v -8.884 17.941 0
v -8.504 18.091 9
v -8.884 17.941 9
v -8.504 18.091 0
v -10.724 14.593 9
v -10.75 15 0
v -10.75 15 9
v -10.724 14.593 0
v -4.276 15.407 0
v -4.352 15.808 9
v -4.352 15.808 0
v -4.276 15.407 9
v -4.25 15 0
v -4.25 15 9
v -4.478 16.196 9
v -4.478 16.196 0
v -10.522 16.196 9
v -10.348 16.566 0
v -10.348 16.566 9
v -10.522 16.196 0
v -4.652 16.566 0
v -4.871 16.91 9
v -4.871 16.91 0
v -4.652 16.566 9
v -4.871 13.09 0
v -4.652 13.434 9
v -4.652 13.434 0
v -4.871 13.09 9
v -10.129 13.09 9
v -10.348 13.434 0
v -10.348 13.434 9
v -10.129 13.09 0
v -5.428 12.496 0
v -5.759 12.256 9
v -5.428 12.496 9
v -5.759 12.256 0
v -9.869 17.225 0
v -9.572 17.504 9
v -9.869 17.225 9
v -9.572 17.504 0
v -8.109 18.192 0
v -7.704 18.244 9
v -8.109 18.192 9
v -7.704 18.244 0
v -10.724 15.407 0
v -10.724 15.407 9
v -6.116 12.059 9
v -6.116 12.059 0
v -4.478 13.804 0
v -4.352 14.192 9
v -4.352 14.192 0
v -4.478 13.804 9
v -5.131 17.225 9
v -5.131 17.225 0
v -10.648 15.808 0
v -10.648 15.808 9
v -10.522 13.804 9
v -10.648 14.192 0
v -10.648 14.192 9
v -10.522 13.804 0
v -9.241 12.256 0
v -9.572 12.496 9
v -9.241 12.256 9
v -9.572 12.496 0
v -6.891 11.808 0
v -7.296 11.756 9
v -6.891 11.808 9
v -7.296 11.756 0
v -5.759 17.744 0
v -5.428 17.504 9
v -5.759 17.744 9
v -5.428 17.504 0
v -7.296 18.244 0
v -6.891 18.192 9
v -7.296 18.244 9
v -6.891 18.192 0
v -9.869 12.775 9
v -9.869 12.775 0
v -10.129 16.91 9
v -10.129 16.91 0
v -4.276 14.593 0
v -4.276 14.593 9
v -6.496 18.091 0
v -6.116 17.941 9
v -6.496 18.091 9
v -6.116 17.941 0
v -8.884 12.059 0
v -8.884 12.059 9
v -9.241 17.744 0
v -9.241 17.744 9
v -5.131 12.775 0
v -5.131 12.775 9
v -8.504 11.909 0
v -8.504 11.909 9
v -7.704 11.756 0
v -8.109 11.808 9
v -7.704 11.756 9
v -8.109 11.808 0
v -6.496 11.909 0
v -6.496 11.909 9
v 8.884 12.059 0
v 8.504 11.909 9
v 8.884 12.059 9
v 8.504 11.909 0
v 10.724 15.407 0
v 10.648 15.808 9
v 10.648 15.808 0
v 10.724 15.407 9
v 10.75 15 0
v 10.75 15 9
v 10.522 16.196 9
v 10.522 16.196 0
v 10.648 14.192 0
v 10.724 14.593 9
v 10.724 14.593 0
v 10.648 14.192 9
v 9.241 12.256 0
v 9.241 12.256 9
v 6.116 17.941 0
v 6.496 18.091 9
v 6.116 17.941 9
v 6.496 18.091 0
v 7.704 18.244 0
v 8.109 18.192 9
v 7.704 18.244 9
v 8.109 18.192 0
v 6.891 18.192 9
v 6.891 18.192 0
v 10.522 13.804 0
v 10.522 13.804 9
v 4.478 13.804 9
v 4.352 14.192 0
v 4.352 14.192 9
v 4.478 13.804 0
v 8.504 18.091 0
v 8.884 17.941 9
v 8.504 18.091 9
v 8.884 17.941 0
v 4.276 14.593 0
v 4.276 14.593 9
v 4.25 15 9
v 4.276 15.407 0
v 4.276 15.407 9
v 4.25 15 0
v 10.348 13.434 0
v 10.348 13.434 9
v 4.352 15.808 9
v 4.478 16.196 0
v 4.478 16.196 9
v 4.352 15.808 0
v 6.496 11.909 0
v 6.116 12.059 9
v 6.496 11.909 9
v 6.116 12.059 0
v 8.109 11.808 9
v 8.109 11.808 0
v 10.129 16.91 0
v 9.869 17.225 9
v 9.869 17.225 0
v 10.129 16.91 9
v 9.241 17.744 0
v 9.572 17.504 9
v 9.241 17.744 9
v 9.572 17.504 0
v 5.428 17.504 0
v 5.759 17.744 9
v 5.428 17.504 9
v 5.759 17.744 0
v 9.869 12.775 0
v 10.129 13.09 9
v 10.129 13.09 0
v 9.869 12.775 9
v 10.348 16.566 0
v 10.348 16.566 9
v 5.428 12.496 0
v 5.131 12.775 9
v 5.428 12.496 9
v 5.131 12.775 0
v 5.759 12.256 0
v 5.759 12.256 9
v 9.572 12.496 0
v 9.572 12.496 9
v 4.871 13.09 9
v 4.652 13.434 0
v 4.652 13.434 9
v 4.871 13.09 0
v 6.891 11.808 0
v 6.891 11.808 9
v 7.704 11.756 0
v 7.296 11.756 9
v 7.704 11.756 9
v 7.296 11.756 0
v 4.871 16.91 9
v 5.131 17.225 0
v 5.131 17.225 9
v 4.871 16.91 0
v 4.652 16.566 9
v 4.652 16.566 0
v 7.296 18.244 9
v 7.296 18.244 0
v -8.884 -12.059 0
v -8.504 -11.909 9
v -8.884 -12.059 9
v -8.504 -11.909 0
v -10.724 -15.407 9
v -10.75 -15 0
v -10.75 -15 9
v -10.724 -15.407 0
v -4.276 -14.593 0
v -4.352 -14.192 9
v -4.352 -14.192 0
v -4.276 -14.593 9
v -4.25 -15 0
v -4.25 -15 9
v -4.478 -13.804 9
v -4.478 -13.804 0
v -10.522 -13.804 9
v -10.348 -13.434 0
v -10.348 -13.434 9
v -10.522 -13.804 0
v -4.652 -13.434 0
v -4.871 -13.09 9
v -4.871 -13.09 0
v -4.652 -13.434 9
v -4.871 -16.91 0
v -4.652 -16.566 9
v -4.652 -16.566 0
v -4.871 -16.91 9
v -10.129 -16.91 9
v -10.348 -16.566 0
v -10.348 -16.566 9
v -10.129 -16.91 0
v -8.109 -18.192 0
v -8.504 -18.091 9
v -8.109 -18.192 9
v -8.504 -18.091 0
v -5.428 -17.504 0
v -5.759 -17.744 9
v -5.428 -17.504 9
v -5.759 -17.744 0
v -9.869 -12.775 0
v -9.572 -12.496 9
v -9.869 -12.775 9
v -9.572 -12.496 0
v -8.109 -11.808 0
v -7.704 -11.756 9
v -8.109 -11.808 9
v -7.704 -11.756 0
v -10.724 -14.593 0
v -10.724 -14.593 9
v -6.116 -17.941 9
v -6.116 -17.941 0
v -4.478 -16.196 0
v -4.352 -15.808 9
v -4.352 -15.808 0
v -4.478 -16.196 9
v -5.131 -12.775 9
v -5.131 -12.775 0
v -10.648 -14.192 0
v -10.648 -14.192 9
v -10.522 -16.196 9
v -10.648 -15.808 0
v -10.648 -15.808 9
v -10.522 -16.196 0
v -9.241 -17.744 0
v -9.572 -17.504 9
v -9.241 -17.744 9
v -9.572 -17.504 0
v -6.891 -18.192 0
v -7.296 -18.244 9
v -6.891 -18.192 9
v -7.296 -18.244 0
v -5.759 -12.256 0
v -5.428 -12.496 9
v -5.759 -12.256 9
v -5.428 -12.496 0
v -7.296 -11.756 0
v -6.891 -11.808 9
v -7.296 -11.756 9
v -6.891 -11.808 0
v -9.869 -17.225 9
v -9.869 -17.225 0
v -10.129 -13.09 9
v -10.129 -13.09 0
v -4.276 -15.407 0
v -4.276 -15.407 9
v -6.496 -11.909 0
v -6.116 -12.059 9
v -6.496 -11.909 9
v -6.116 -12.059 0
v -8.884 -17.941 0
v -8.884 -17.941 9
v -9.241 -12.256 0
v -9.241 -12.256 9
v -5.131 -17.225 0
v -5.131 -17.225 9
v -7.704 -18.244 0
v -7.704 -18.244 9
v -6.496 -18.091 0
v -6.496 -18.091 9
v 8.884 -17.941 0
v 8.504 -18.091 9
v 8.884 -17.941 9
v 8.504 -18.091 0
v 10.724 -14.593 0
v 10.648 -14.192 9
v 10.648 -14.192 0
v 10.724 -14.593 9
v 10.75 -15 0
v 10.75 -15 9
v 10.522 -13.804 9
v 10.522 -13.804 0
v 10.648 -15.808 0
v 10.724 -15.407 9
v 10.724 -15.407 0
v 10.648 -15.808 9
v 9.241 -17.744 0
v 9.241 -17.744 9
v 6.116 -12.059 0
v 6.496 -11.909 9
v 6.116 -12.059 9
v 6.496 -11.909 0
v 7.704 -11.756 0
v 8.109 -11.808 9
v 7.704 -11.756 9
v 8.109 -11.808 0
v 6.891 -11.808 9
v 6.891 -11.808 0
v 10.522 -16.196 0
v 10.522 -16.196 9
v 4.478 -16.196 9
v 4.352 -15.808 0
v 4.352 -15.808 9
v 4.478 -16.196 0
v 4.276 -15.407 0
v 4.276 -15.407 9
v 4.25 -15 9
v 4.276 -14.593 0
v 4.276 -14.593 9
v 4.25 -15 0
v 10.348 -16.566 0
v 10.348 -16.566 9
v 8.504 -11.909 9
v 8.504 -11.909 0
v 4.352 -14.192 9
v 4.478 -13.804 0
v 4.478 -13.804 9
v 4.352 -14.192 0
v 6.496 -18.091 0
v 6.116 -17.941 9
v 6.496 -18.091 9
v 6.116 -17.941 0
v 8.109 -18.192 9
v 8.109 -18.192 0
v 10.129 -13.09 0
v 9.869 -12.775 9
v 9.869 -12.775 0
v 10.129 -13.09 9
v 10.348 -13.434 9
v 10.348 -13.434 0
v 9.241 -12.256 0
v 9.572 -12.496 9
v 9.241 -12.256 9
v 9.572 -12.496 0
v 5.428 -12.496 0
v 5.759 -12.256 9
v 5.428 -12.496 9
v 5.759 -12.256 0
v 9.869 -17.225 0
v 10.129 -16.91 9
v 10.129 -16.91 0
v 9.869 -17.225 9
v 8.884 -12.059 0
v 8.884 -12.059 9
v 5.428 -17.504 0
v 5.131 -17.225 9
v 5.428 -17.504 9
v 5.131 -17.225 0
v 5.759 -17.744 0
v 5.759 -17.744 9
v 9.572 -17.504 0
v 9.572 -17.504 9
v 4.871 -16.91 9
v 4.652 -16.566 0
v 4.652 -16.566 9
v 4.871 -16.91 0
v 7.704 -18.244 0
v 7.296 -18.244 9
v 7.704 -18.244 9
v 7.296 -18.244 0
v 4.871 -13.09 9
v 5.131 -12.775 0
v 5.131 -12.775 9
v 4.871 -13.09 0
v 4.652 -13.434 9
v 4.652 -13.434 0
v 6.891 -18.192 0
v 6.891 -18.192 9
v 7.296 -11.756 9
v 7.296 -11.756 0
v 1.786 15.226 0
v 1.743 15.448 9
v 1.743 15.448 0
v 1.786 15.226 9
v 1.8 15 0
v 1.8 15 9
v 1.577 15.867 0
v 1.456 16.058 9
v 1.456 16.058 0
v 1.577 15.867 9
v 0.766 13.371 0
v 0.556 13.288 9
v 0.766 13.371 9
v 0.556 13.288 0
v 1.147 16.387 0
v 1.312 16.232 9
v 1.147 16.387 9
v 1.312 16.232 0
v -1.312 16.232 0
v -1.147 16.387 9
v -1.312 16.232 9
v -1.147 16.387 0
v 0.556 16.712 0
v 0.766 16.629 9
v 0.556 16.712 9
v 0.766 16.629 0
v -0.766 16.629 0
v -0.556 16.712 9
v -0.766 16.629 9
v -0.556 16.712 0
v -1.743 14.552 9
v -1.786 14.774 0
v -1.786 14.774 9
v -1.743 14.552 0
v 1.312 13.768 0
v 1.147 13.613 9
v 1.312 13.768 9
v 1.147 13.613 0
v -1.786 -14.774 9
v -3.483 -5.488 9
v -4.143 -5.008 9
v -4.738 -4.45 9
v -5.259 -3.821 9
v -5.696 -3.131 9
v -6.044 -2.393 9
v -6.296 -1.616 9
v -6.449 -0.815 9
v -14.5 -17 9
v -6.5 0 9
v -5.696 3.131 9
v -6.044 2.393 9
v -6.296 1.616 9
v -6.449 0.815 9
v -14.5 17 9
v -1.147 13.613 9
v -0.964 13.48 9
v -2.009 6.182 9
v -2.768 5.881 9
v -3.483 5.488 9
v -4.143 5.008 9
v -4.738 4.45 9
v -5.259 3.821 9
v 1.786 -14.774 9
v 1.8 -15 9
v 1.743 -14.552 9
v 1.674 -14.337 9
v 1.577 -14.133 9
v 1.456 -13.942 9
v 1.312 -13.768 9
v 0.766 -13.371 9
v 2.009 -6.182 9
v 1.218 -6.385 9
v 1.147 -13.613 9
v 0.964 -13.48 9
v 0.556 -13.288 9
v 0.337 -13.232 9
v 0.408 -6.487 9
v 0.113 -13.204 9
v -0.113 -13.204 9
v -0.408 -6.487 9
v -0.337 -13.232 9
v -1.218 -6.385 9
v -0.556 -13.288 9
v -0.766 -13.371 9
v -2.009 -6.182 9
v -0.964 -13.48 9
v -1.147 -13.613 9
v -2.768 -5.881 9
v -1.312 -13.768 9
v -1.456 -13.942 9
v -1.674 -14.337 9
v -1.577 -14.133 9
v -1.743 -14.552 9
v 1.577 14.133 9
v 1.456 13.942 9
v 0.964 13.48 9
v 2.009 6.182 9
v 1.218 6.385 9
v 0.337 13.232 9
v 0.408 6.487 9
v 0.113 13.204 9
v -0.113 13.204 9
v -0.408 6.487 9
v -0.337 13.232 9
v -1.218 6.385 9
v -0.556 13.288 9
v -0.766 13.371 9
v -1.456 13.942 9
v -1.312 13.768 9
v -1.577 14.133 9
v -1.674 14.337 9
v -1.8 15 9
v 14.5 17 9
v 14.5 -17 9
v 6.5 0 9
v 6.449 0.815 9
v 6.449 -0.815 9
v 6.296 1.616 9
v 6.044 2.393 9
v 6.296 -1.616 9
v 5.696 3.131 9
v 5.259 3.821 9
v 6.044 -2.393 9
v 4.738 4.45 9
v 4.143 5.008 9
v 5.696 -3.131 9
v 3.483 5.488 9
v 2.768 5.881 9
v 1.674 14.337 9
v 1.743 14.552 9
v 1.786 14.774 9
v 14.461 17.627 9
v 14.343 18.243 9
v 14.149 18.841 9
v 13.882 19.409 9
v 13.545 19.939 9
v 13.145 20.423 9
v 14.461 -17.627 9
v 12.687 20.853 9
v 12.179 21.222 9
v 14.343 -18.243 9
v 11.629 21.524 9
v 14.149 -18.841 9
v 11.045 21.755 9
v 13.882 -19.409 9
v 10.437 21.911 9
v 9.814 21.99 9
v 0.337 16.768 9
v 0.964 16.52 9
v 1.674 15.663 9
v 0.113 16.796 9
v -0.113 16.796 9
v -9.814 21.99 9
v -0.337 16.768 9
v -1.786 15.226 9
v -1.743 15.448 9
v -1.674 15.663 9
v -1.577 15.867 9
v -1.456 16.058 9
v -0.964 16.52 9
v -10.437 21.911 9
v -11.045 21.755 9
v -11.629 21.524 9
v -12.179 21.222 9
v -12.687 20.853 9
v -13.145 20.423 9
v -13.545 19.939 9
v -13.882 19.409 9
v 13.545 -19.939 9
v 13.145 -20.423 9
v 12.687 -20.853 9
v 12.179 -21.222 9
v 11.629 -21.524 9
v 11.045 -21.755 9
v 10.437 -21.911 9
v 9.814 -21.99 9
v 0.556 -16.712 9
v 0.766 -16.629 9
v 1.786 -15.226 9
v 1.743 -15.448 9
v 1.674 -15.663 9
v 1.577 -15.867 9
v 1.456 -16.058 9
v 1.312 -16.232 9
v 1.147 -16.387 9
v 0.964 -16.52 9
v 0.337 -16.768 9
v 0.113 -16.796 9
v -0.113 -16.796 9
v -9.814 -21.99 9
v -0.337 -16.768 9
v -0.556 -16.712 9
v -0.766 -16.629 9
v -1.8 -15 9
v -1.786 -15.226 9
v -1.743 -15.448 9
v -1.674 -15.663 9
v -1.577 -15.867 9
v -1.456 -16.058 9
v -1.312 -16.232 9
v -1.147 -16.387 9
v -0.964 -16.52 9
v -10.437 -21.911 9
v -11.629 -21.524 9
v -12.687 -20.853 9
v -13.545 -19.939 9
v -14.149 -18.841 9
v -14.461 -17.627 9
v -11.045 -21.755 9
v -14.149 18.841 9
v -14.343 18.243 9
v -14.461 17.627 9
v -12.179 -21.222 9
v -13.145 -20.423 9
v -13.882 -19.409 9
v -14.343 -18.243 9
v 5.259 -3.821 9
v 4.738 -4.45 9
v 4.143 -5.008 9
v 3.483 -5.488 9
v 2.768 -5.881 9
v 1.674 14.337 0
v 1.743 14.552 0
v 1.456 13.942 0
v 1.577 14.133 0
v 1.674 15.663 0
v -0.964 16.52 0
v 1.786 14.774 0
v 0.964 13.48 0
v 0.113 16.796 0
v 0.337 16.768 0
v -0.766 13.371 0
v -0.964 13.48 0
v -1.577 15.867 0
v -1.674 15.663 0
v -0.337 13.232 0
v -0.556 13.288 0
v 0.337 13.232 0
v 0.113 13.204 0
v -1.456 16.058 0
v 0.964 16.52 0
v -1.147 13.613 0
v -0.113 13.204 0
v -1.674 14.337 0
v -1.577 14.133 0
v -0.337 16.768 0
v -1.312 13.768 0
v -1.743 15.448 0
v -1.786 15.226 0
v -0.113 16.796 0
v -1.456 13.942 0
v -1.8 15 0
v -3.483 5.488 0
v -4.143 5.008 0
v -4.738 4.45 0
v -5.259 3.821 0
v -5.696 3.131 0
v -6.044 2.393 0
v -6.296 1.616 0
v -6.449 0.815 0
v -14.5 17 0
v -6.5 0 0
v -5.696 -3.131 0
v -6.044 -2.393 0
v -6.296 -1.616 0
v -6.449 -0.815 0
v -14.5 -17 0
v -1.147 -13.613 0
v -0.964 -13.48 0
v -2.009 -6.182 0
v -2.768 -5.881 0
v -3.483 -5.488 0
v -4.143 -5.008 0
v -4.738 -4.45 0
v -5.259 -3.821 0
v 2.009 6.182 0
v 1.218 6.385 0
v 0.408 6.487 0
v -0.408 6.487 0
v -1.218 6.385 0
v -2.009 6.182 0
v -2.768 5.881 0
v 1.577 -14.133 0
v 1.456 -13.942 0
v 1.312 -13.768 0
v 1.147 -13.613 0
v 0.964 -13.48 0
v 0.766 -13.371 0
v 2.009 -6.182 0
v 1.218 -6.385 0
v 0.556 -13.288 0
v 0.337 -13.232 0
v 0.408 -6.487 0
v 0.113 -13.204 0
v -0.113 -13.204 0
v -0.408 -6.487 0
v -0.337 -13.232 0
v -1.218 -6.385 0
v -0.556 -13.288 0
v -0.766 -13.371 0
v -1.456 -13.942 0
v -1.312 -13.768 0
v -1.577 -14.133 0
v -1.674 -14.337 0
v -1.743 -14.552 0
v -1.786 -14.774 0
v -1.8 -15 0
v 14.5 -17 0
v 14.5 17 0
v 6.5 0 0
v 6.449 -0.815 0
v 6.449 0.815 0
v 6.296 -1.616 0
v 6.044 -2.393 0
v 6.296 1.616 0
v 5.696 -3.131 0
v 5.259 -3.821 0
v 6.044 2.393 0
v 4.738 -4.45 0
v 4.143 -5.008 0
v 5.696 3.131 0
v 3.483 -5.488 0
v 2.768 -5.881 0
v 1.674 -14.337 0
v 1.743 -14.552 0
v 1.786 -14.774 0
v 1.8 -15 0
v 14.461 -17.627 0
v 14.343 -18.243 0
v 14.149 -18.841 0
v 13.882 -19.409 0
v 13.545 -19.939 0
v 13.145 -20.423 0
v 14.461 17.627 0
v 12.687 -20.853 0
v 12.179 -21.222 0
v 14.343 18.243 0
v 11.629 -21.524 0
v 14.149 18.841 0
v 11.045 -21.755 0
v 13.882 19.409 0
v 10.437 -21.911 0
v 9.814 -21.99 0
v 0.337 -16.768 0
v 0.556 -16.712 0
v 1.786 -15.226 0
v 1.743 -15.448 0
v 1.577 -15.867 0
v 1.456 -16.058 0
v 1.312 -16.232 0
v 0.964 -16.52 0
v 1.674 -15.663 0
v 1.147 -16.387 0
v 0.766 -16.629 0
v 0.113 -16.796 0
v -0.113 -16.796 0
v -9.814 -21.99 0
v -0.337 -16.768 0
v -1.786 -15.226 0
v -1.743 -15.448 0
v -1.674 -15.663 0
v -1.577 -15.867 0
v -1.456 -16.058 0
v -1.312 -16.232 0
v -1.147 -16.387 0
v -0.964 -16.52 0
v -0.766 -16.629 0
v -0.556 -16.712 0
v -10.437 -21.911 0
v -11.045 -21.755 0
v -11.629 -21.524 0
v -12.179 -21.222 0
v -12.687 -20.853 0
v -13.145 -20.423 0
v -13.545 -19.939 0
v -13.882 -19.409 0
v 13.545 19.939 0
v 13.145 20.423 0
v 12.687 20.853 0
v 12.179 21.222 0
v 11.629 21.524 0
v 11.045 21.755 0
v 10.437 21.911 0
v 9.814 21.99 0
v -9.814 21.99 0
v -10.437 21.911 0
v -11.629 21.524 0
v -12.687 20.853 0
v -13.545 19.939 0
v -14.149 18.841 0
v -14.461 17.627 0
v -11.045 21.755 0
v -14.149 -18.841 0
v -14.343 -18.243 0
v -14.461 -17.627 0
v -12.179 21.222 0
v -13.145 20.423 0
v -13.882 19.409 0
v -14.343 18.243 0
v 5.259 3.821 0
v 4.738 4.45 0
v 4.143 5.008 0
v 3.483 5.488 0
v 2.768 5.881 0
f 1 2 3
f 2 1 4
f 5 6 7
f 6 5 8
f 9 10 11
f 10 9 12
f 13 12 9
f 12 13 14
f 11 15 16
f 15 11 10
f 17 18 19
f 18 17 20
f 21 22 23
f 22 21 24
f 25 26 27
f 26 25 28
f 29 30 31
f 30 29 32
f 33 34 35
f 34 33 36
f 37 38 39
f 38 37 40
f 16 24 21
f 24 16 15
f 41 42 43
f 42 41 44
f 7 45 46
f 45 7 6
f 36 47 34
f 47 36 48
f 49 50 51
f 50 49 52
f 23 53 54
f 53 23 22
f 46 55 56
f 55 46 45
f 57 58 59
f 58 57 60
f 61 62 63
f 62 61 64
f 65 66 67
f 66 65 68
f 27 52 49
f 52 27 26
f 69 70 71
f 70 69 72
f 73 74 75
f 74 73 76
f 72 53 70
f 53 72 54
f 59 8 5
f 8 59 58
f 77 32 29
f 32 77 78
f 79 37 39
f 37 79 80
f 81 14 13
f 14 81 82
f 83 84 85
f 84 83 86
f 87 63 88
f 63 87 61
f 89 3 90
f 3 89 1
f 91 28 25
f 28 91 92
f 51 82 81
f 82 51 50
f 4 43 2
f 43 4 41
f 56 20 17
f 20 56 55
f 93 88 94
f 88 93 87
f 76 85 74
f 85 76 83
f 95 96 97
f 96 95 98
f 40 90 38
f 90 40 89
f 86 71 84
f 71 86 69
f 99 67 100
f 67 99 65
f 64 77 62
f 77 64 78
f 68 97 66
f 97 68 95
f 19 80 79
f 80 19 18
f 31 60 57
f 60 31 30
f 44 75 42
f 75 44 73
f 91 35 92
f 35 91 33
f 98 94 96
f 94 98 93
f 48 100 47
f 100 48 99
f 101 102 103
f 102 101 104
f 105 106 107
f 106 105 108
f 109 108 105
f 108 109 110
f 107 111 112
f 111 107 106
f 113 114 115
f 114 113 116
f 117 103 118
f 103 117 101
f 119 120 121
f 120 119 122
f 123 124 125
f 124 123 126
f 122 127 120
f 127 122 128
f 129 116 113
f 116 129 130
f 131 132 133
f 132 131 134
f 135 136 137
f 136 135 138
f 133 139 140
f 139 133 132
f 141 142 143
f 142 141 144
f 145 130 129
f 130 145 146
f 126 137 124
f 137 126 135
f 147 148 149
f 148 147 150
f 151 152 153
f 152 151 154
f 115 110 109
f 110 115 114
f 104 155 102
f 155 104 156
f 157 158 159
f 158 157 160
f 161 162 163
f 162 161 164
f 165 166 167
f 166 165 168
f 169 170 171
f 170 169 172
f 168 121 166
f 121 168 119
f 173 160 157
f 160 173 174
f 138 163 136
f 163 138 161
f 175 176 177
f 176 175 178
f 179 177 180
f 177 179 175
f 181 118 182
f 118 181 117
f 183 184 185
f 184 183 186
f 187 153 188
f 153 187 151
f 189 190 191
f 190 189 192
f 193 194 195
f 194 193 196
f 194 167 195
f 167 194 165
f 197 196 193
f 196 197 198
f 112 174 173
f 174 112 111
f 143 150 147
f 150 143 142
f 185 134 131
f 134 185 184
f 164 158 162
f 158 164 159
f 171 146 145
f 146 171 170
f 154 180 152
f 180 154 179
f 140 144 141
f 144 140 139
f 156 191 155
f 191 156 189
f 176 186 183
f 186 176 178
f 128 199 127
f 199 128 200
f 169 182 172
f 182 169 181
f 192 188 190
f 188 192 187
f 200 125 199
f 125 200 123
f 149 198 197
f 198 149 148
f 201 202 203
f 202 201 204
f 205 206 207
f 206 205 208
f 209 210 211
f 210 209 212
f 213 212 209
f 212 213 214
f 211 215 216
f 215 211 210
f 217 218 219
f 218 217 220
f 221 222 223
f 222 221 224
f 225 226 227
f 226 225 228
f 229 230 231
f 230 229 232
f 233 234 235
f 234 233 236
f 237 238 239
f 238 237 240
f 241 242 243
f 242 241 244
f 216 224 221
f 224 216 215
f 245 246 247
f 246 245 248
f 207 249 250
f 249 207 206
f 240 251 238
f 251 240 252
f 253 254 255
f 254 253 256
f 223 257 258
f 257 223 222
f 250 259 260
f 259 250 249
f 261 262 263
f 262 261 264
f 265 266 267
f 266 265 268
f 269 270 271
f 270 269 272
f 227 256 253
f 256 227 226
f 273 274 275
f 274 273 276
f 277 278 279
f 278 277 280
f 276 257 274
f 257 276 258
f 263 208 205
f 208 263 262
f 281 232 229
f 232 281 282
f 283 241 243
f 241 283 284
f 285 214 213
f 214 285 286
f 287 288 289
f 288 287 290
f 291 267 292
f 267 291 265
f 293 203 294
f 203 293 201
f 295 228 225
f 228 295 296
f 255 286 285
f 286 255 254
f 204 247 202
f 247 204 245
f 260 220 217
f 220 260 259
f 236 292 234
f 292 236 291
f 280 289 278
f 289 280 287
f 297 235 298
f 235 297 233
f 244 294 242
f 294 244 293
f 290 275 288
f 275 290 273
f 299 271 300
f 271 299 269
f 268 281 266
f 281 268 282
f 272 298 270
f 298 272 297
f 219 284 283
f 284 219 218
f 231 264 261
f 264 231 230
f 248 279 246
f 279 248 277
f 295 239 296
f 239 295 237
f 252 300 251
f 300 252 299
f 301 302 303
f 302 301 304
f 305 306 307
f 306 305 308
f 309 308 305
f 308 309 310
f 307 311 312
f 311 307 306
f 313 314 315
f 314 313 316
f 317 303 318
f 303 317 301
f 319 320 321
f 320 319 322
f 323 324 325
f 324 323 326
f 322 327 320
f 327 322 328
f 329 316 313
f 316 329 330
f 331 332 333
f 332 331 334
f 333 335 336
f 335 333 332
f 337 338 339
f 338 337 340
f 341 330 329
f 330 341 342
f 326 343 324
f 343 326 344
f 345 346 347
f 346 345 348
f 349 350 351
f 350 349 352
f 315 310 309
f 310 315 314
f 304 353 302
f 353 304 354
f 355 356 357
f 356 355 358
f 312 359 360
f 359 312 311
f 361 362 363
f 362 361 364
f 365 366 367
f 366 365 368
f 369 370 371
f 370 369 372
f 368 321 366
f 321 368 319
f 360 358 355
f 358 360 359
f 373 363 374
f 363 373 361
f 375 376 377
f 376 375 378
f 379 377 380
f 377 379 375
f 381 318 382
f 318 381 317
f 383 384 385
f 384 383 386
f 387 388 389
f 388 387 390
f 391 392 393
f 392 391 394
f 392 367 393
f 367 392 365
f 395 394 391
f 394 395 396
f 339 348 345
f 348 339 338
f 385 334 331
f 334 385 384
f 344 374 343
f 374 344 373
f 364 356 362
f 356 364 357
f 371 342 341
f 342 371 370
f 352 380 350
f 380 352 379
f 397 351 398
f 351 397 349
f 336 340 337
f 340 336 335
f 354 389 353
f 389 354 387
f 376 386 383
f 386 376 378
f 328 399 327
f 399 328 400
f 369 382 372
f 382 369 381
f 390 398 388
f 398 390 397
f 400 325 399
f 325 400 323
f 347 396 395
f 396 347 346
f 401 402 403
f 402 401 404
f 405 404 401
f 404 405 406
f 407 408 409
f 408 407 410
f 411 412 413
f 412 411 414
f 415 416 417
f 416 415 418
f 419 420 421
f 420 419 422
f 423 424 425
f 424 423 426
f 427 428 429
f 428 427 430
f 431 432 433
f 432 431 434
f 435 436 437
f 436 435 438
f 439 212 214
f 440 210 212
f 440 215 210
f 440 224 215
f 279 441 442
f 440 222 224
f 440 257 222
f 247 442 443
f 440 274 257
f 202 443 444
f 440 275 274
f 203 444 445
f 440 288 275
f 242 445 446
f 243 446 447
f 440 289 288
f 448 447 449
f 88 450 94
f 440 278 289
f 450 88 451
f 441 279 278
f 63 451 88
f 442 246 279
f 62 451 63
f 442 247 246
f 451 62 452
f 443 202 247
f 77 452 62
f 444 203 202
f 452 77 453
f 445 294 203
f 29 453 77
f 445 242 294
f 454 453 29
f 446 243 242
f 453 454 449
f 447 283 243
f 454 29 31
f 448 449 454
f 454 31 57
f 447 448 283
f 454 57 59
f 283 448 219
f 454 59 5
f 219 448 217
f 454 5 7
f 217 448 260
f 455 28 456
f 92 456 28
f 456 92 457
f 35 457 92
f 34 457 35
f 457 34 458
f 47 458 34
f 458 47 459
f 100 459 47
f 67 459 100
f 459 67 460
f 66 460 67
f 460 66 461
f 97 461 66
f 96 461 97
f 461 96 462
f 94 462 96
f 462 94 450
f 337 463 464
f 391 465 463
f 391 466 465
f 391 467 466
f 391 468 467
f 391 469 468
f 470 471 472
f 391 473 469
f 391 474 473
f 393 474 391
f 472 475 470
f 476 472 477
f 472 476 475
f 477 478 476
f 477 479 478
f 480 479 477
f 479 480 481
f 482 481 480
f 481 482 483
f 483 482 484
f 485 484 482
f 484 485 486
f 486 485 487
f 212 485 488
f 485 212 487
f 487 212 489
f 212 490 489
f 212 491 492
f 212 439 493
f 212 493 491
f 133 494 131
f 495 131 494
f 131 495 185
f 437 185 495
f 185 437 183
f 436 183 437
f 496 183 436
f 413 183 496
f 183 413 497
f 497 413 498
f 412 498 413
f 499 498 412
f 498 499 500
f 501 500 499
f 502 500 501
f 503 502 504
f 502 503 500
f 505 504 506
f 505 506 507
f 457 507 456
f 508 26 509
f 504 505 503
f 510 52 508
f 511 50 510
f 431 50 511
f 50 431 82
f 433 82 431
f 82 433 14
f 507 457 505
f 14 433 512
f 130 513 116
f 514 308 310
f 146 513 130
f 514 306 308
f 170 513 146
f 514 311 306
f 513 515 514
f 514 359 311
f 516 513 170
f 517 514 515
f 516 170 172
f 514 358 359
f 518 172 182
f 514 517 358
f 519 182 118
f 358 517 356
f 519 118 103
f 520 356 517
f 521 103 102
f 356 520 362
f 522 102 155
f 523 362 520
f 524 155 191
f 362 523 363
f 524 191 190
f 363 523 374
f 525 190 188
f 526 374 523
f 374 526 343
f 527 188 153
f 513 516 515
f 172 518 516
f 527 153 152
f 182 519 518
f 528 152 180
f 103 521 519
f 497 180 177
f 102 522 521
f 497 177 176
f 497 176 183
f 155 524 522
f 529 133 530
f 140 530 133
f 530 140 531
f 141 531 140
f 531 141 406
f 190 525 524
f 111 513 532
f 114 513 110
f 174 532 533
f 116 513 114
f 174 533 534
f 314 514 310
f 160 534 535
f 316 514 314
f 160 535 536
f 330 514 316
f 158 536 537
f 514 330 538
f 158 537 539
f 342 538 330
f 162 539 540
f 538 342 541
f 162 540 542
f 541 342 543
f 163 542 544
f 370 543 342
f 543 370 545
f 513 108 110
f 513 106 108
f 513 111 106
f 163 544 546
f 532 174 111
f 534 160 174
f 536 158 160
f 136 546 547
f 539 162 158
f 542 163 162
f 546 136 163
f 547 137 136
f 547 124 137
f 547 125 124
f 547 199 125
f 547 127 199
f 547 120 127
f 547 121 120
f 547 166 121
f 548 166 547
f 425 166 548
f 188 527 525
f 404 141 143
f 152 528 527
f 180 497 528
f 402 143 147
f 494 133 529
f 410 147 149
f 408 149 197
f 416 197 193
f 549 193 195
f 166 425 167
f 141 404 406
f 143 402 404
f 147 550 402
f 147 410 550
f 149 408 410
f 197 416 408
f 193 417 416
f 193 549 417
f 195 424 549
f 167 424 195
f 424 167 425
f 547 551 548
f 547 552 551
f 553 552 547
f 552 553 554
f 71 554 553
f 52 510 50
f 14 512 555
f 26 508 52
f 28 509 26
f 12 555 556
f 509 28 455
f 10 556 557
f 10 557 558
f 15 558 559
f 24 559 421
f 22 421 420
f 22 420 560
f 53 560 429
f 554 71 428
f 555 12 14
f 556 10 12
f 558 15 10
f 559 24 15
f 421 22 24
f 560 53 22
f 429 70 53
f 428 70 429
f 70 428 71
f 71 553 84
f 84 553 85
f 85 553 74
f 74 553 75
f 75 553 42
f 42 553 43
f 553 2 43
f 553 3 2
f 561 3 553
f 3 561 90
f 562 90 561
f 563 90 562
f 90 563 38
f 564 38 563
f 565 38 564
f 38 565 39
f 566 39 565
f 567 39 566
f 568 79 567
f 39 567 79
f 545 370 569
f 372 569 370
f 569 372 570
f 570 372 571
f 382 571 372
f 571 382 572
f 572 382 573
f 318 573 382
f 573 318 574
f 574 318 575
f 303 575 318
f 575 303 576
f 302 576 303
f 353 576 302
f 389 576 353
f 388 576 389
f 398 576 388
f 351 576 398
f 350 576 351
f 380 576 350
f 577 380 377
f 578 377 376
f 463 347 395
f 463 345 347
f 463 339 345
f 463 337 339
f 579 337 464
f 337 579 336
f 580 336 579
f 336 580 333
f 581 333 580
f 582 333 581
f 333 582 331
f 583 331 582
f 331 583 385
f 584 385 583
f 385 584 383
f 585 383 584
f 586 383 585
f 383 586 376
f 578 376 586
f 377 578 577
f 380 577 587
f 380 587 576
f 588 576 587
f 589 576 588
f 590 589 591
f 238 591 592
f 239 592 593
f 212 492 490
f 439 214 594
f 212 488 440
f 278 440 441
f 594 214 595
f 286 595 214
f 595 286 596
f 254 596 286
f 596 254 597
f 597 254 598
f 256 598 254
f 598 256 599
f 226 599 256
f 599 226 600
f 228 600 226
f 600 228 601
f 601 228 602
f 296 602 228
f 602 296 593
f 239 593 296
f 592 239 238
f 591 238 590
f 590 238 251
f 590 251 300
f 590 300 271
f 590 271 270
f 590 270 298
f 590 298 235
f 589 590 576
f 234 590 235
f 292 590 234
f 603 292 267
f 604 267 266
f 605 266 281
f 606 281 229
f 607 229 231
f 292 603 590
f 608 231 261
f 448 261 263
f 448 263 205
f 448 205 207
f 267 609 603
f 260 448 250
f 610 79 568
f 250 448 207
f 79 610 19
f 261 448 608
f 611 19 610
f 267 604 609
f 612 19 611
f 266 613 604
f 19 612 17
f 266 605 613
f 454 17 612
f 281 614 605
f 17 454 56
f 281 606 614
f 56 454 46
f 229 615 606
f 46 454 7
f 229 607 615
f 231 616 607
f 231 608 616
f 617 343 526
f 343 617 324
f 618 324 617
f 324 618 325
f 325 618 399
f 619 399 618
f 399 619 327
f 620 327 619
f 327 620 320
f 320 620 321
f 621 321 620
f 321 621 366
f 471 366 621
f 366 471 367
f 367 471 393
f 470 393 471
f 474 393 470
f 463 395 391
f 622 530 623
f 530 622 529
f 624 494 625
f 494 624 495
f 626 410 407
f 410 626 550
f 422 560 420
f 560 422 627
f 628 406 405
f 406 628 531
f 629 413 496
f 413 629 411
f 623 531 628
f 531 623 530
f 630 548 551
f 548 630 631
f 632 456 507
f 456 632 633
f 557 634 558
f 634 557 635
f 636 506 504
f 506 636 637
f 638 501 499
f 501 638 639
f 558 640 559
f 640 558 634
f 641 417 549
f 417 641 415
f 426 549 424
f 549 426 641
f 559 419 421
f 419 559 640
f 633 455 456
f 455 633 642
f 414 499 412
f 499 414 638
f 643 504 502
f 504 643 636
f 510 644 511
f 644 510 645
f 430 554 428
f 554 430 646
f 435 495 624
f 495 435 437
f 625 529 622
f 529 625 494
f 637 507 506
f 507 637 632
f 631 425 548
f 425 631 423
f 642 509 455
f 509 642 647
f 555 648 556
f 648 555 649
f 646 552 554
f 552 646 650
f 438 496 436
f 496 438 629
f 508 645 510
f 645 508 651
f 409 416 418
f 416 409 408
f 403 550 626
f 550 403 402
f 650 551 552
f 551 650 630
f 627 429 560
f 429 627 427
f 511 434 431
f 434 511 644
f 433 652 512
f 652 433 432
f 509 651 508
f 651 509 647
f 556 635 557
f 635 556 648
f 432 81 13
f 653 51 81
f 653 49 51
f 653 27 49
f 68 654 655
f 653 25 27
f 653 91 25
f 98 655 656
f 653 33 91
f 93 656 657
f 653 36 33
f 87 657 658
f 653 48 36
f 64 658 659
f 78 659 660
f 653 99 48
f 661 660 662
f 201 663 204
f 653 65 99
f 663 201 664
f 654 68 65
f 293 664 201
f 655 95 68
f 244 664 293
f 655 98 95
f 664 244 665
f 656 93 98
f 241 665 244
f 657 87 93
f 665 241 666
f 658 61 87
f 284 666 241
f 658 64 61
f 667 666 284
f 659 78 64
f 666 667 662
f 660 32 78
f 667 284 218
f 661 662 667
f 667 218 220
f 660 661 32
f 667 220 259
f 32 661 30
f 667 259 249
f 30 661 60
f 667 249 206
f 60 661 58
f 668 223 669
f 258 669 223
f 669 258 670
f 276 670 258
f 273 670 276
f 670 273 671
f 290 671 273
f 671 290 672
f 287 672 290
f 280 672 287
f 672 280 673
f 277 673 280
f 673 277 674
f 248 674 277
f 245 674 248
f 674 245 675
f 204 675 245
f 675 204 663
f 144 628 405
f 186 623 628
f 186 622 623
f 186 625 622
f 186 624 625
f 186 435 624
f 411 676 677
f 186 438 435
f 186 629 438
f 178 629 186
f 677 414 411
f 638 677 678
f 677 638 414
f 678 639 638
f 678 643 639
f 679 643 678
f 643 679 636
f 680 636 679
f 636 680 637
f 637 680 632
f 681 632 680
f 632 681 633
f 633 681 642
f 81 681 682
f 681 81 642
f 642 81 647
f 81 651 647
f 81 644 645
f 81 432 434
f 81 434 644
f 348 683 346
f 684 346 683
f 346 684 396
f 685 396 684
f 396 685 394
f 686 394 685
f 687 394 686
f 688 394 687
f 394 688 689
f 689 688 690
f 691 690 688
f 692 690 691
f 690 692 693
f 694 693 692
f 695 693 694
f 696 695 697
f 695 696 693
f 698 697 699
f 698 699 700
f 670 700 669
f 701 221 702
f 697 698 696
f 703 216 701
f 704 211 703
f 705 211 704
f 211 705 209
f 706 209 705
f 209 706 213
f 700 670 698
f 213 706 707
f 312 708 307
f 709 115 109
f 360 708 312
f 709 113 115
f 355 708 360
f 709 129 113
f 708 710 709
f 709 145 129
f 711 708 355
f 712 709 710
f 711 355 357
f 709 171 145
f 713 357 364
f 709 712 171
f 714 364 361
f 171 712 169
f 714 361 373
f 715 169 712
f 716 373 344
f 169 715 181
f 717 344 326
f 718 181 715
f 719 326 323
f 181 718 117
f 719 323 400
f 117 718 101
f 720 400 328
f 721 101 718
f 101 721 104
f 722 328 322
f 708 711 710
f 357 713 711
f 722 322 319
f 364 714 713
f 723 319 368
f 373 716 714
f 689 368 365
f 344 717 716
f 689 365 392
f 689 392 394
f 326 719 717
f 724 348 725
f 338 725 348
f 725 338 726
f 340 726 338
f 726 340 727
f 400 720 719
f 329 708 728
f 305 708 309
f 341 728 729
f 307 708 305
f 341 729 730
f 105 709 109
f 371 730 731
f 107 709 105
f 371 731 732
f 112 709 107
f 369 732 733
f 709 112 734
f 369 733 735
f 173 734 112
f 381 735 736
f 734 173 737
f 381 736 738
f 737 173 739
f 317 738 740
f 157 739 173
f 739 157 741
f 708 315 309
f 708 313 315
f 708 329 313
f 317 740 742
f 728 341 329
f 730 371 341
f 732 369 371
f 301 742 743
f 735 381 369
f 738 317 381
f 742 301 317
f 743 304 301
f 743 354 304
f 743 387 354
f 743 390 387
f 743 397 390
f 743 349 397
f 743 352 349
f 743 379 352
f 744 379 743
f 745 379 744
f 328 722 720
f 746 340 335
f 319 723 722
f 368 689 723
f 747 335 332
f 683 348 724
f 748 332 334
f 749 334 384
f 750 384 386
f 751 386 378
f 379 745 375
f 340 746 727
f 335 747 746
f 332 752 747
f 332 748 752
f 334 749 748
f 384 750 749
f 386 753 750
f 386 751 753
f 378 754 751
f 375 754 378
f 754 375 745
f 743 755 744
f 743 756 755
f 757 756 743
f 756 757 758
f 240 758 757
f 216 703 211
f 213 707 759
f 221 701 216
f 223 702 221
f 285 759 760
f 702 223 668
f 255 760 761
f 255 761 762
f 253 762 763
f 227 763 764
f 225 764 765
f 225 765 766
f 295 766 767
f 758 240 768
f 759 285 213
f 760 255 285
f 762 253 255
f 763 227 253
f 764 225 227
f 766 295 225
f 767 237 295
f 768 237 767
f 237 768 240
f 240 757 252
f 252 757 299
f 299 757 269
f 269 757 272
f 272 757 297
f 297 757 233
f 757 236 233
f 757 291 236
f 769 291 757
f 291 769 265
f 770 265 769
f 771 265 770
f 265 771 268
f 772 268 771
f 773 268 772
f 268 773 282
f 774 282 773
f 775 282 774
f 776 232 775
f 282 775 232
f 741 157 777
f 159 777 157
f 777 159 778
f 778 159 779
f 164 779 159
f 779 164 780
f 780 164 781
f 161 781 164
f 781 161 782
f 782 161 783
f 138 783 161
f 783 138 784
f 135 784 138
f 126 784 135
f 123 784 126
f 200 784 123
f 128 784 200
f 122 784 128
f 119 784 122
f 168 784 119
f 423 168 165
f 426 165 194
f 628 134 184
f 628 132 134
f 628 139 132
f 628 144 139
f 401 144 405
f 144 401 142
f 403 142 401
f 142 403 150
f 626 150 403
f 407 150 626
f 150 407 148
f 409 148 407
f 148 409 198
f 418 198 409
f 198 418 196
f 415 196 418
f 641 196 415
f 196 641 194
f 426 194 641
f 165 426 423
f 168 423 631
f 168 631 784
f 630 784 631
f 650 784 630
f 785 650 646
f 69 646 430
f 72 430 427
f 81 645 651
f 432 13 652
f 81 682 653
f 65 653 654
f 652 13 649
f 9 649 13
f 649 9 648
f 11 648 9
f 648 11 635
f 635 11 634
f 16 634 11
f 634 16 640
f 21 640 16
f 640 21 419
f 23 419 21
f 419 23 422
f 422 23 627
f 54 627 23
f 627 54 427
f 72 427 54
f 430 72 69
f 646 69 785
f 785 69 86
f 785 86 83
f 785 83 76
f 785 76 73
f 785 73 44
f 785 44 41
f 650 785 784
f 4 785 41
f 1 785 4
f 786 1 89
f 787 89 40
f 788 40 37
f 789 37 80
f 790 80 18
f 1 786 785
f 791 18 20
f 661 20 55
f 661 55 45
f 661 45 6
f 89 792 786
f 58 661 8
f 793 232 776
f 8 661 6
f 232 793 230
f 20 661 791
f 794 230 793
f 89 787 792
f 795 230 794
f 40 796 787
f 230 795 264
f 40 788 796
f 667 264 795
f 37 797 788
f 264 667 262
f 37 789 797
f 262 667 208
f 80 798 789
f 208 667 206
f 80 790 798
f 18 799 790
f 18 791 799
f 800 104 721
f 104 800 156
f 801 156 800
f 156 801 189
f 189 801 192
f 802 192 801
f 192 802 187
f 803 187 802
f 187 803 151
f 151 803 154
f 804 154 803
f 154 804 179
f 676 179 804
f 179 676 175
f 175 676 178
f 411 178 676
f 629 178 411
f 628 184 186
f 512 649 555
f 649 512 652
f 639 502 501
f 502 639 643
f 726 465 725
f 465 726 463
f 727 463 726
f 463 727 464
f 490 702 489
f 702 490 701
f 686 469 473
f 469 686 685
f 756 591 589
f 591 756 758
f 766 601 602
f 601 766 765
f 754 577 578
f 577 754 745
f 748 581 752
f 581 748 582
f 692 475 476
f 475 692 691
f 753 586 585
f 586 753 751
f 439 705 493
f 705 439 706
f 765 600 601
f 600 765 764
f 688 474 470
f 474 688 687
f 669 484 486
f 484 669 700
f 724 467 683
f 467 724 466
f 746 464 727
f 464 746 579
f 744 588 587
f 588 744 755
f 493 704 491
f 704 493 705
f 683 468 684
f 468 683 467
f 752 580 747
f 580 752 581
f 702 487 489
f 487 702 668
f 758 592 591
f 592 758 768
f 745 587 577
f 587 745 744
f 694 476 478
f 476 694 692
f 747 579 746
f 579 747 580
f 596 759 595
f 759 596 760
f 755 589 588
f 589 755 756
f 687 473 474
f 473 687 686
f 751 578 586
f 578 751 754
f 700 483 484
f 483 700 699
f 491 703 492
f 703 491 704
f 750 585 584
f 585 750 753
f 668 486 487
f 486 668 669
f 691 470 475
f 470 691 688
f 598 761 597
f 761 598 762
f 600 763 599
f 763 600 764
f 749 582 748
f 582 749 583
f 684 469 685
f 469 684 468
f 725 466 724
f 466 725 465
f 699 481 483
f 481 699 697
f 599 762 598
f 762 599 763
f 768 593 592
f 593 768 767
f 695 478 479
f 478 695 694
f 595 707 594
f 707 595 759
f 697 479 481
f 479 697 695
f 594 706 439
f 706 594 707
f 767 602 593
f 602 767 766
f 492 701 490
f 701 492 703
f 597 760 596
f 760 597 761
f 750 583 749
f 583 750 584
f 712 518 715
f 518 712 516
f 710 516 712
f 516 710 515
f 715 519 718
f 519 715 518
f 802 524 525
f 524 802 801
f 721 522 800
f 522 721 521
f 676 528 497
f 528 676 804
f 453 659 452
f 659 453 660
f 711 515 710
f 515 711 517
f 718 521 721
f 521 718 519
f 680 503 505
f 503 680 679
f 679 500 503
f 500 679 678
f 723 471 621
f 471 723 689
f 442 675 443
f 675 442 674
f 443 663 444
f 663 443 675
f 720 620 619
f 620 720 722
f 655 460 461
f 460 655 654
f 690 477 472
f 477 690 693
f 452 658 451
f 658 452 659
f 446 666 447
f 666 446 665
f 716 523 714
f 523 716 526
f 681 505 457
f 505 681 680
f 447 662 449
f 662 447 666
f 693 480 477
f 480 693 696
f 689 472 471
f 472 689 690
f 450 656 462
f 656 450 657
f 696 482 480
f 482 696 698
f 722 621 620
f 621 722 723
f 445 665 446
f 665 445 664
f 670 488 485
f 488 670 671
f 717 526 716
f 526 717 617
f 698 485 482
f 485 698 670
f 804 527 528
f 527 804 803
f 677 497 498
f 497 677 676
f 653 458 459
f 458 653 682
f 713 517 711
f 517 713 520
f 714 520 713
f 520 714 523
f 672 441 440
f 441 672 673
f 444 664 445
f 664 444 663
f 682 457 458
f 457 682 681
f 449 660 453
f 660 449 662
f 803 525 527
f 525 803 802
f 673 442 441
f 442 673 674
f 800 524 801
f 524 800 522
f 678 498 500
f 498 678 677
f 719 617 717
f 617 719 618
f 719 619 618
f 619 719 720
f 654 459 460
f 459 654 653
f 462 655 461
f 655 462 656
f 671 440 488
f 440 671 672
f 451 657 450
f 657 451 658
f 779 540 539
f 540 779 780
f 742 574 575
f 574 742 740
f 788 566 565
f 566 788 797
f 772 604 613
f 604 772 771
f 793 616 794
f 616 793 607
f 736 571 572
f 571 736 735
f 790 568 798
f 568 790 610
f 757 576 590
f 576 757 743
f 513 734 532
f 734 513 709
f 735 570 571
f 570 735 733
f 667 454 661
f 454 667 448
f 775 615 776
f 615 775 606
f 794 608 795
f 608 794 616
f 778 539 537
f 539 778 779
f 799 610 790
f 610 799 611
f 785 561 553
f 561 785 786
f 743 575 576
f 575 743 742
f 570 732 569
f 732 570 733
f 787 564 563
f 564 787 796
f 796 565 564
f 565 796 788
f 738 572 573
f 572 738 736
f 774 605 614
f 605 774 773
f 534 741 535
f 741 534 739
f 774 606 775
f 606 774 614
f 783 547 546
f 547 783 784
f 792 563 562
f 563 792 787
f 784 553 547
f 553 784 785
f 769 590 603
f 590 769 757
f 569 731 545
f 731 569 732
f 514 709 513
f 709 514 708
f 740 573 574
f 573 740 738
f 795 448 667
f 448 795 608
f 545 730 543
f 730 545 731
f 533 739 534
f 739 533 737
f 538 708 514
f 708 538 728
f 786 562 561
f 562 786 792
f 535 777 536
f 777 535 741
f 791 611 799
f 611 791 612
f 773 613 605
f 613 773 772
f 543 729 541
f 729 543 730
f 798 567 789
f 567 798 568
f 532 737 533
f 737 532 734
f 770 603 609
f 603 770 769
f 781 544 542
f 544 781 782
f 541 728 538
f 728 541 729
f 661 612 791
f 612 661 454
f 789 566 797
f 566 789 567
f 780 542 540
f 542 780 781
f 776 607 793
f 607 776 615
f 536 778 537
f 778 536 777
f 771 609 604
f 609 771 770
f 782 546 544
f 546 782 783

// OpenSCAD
$fn = 50;


difference() {
	union() {
		hull() {
			translate(v = [-9.5000000000, 17.0000000000, 0]) {
				cylinder(h = 9, r = 5);
			}
			translate(v = [9.5000000000, 17.0000000000, 0]) {
				cylinder(h = 9, r = 5);
			}
			translate(v = [-9.5000000000, -17.0000000000, 0]) {
				cylinder(h = 9, r = 5);
			}
			translate(v = [9.5000000000, -17.0000000000, 0]) {
				cylinder(h = 9, r = 5);
			}
		}
	}
	union() {
		#translate(v = [-7.5000000000, 15.0000000000, 0]) {
			cylinder(h = 9, r = 3.2500000000);
		}
		#translate(v = [7.5000000000, 15.0000000000, 0]) {
			cylinder(h = 9, r = 3.2500000000);
		}
		#translate(v = [-7.5000000000, -15.0000000000, 0]) {
			cylinder(h = 9, r = 3.2500000000);
		}
		#translate(v = [7.5000000000, -15.0000000000, 0]) {
			cylinder(h = 9, r = 3.2500000000);
		}
		#translate(v = [-7.5000000000, -15.0000000000, -100.0000000000]) {
			cylinder(h = 200, r = 3.2500000000);
		}
		#translate(v = [-7.5000000000, 15.0000000000, -100.0000000000]) {
			cylinder(h = 200, r = 3.2500000000);
		}
		#translate(v = [7.5000000000, -15.0000000000, -100.0000000000]) {
			cylinder(h = 200, r = 3.2500000000);
		}
		#translate(v = [7.5000000000, 15.0000000000, -100.0000000000]) {
			cylinder(h = 200, r = 3.2500000000);
		}
		#translate(v = [-7.5000000000, 15.0000000000, 0]) {
			cylinder(h = 9, r = 1.8000000000);
		}
		#translate(v = [0.0000000000, 15.0000000000, 0]) {
			cylinder(h = 9, r = 1.8000000000);
		}
		#translate(v = [7.5000000000, 15.0000000000, 0]) {
			cylinder(h = 9, r = 1.8000000000);
		}
		#translate(v = [-7.5000000000, -15.0000000000, 0]) {
			cylinder(h = 9, r = 1.8000000000);
		}
		#translate(v = [0.0000000000, -15.0000000000, 0]) {
			cylinder(h = 9, r = 1.8000000000);
		}
		#translate(v = [7.5000000000, -15.0000000000, 0]) {
			cylinder(h = 9, r = 1.8000000000);
		}
		#translate(v = [-7.5000000000, 15.0000000000, 0]) {
			cylinder(h = 9, r = 1.8000000000);
		}
		#translate(v = [0.0000000000, 15.0000000000, 0]) {
			cylinder(h = 9, r = 1.8000000000);
		}
		#translate(v = [7.5000000000, 15.0000000000, 0]) {
			cylinder(h = 9, r = 1.8000000000);
		}
		#translate(v = [-7.5000000000, -15.0000000000, 0]) {
			cylinder(h = 9, r = 1.8000000000);
		}
		#translate(v = [0.0000000000, -15.0000000000, 0]) {
			cylinder(h = 9, r = 1.8000000000);
		}
		#translate(v = [7.5000000000, -15.0000000000, 0]) {
			cylinder(h = 9, r = 1.8000000000);
		}
		#translate(v = [-7.5000000000, 15.0000000000, 0]) {
			cylinder(h = 9, r = 1.8000000000);
		}
		#translate(v = [0.0000000000, 15.0000000000, 0]) {
			cylinder(h = 9, r = 1.8000000000);
		}
		#translate(v = [7.5000000000, 15.0000000000, 0]) {
			cylinder(h = 9, r = 1.8000000000);
		}
		#translate(v = [-7.5000000000, -15.0000000000, 0]) {
			cylinder(h = 9, r = 1.8000000000);
		}
		#translate(v = [0.0000000000, -15.0000000000, 0]) {
			cylinder(h = 9, r = 1.8000000000);
		}
		#translate(v = [7.5000000000, -15.0000000000, 0]) {
			cylinder(h = 9, r = 1.8000000000);
		}
		#cylinder(h = 9, r = 6.5000000000);
	}
}
